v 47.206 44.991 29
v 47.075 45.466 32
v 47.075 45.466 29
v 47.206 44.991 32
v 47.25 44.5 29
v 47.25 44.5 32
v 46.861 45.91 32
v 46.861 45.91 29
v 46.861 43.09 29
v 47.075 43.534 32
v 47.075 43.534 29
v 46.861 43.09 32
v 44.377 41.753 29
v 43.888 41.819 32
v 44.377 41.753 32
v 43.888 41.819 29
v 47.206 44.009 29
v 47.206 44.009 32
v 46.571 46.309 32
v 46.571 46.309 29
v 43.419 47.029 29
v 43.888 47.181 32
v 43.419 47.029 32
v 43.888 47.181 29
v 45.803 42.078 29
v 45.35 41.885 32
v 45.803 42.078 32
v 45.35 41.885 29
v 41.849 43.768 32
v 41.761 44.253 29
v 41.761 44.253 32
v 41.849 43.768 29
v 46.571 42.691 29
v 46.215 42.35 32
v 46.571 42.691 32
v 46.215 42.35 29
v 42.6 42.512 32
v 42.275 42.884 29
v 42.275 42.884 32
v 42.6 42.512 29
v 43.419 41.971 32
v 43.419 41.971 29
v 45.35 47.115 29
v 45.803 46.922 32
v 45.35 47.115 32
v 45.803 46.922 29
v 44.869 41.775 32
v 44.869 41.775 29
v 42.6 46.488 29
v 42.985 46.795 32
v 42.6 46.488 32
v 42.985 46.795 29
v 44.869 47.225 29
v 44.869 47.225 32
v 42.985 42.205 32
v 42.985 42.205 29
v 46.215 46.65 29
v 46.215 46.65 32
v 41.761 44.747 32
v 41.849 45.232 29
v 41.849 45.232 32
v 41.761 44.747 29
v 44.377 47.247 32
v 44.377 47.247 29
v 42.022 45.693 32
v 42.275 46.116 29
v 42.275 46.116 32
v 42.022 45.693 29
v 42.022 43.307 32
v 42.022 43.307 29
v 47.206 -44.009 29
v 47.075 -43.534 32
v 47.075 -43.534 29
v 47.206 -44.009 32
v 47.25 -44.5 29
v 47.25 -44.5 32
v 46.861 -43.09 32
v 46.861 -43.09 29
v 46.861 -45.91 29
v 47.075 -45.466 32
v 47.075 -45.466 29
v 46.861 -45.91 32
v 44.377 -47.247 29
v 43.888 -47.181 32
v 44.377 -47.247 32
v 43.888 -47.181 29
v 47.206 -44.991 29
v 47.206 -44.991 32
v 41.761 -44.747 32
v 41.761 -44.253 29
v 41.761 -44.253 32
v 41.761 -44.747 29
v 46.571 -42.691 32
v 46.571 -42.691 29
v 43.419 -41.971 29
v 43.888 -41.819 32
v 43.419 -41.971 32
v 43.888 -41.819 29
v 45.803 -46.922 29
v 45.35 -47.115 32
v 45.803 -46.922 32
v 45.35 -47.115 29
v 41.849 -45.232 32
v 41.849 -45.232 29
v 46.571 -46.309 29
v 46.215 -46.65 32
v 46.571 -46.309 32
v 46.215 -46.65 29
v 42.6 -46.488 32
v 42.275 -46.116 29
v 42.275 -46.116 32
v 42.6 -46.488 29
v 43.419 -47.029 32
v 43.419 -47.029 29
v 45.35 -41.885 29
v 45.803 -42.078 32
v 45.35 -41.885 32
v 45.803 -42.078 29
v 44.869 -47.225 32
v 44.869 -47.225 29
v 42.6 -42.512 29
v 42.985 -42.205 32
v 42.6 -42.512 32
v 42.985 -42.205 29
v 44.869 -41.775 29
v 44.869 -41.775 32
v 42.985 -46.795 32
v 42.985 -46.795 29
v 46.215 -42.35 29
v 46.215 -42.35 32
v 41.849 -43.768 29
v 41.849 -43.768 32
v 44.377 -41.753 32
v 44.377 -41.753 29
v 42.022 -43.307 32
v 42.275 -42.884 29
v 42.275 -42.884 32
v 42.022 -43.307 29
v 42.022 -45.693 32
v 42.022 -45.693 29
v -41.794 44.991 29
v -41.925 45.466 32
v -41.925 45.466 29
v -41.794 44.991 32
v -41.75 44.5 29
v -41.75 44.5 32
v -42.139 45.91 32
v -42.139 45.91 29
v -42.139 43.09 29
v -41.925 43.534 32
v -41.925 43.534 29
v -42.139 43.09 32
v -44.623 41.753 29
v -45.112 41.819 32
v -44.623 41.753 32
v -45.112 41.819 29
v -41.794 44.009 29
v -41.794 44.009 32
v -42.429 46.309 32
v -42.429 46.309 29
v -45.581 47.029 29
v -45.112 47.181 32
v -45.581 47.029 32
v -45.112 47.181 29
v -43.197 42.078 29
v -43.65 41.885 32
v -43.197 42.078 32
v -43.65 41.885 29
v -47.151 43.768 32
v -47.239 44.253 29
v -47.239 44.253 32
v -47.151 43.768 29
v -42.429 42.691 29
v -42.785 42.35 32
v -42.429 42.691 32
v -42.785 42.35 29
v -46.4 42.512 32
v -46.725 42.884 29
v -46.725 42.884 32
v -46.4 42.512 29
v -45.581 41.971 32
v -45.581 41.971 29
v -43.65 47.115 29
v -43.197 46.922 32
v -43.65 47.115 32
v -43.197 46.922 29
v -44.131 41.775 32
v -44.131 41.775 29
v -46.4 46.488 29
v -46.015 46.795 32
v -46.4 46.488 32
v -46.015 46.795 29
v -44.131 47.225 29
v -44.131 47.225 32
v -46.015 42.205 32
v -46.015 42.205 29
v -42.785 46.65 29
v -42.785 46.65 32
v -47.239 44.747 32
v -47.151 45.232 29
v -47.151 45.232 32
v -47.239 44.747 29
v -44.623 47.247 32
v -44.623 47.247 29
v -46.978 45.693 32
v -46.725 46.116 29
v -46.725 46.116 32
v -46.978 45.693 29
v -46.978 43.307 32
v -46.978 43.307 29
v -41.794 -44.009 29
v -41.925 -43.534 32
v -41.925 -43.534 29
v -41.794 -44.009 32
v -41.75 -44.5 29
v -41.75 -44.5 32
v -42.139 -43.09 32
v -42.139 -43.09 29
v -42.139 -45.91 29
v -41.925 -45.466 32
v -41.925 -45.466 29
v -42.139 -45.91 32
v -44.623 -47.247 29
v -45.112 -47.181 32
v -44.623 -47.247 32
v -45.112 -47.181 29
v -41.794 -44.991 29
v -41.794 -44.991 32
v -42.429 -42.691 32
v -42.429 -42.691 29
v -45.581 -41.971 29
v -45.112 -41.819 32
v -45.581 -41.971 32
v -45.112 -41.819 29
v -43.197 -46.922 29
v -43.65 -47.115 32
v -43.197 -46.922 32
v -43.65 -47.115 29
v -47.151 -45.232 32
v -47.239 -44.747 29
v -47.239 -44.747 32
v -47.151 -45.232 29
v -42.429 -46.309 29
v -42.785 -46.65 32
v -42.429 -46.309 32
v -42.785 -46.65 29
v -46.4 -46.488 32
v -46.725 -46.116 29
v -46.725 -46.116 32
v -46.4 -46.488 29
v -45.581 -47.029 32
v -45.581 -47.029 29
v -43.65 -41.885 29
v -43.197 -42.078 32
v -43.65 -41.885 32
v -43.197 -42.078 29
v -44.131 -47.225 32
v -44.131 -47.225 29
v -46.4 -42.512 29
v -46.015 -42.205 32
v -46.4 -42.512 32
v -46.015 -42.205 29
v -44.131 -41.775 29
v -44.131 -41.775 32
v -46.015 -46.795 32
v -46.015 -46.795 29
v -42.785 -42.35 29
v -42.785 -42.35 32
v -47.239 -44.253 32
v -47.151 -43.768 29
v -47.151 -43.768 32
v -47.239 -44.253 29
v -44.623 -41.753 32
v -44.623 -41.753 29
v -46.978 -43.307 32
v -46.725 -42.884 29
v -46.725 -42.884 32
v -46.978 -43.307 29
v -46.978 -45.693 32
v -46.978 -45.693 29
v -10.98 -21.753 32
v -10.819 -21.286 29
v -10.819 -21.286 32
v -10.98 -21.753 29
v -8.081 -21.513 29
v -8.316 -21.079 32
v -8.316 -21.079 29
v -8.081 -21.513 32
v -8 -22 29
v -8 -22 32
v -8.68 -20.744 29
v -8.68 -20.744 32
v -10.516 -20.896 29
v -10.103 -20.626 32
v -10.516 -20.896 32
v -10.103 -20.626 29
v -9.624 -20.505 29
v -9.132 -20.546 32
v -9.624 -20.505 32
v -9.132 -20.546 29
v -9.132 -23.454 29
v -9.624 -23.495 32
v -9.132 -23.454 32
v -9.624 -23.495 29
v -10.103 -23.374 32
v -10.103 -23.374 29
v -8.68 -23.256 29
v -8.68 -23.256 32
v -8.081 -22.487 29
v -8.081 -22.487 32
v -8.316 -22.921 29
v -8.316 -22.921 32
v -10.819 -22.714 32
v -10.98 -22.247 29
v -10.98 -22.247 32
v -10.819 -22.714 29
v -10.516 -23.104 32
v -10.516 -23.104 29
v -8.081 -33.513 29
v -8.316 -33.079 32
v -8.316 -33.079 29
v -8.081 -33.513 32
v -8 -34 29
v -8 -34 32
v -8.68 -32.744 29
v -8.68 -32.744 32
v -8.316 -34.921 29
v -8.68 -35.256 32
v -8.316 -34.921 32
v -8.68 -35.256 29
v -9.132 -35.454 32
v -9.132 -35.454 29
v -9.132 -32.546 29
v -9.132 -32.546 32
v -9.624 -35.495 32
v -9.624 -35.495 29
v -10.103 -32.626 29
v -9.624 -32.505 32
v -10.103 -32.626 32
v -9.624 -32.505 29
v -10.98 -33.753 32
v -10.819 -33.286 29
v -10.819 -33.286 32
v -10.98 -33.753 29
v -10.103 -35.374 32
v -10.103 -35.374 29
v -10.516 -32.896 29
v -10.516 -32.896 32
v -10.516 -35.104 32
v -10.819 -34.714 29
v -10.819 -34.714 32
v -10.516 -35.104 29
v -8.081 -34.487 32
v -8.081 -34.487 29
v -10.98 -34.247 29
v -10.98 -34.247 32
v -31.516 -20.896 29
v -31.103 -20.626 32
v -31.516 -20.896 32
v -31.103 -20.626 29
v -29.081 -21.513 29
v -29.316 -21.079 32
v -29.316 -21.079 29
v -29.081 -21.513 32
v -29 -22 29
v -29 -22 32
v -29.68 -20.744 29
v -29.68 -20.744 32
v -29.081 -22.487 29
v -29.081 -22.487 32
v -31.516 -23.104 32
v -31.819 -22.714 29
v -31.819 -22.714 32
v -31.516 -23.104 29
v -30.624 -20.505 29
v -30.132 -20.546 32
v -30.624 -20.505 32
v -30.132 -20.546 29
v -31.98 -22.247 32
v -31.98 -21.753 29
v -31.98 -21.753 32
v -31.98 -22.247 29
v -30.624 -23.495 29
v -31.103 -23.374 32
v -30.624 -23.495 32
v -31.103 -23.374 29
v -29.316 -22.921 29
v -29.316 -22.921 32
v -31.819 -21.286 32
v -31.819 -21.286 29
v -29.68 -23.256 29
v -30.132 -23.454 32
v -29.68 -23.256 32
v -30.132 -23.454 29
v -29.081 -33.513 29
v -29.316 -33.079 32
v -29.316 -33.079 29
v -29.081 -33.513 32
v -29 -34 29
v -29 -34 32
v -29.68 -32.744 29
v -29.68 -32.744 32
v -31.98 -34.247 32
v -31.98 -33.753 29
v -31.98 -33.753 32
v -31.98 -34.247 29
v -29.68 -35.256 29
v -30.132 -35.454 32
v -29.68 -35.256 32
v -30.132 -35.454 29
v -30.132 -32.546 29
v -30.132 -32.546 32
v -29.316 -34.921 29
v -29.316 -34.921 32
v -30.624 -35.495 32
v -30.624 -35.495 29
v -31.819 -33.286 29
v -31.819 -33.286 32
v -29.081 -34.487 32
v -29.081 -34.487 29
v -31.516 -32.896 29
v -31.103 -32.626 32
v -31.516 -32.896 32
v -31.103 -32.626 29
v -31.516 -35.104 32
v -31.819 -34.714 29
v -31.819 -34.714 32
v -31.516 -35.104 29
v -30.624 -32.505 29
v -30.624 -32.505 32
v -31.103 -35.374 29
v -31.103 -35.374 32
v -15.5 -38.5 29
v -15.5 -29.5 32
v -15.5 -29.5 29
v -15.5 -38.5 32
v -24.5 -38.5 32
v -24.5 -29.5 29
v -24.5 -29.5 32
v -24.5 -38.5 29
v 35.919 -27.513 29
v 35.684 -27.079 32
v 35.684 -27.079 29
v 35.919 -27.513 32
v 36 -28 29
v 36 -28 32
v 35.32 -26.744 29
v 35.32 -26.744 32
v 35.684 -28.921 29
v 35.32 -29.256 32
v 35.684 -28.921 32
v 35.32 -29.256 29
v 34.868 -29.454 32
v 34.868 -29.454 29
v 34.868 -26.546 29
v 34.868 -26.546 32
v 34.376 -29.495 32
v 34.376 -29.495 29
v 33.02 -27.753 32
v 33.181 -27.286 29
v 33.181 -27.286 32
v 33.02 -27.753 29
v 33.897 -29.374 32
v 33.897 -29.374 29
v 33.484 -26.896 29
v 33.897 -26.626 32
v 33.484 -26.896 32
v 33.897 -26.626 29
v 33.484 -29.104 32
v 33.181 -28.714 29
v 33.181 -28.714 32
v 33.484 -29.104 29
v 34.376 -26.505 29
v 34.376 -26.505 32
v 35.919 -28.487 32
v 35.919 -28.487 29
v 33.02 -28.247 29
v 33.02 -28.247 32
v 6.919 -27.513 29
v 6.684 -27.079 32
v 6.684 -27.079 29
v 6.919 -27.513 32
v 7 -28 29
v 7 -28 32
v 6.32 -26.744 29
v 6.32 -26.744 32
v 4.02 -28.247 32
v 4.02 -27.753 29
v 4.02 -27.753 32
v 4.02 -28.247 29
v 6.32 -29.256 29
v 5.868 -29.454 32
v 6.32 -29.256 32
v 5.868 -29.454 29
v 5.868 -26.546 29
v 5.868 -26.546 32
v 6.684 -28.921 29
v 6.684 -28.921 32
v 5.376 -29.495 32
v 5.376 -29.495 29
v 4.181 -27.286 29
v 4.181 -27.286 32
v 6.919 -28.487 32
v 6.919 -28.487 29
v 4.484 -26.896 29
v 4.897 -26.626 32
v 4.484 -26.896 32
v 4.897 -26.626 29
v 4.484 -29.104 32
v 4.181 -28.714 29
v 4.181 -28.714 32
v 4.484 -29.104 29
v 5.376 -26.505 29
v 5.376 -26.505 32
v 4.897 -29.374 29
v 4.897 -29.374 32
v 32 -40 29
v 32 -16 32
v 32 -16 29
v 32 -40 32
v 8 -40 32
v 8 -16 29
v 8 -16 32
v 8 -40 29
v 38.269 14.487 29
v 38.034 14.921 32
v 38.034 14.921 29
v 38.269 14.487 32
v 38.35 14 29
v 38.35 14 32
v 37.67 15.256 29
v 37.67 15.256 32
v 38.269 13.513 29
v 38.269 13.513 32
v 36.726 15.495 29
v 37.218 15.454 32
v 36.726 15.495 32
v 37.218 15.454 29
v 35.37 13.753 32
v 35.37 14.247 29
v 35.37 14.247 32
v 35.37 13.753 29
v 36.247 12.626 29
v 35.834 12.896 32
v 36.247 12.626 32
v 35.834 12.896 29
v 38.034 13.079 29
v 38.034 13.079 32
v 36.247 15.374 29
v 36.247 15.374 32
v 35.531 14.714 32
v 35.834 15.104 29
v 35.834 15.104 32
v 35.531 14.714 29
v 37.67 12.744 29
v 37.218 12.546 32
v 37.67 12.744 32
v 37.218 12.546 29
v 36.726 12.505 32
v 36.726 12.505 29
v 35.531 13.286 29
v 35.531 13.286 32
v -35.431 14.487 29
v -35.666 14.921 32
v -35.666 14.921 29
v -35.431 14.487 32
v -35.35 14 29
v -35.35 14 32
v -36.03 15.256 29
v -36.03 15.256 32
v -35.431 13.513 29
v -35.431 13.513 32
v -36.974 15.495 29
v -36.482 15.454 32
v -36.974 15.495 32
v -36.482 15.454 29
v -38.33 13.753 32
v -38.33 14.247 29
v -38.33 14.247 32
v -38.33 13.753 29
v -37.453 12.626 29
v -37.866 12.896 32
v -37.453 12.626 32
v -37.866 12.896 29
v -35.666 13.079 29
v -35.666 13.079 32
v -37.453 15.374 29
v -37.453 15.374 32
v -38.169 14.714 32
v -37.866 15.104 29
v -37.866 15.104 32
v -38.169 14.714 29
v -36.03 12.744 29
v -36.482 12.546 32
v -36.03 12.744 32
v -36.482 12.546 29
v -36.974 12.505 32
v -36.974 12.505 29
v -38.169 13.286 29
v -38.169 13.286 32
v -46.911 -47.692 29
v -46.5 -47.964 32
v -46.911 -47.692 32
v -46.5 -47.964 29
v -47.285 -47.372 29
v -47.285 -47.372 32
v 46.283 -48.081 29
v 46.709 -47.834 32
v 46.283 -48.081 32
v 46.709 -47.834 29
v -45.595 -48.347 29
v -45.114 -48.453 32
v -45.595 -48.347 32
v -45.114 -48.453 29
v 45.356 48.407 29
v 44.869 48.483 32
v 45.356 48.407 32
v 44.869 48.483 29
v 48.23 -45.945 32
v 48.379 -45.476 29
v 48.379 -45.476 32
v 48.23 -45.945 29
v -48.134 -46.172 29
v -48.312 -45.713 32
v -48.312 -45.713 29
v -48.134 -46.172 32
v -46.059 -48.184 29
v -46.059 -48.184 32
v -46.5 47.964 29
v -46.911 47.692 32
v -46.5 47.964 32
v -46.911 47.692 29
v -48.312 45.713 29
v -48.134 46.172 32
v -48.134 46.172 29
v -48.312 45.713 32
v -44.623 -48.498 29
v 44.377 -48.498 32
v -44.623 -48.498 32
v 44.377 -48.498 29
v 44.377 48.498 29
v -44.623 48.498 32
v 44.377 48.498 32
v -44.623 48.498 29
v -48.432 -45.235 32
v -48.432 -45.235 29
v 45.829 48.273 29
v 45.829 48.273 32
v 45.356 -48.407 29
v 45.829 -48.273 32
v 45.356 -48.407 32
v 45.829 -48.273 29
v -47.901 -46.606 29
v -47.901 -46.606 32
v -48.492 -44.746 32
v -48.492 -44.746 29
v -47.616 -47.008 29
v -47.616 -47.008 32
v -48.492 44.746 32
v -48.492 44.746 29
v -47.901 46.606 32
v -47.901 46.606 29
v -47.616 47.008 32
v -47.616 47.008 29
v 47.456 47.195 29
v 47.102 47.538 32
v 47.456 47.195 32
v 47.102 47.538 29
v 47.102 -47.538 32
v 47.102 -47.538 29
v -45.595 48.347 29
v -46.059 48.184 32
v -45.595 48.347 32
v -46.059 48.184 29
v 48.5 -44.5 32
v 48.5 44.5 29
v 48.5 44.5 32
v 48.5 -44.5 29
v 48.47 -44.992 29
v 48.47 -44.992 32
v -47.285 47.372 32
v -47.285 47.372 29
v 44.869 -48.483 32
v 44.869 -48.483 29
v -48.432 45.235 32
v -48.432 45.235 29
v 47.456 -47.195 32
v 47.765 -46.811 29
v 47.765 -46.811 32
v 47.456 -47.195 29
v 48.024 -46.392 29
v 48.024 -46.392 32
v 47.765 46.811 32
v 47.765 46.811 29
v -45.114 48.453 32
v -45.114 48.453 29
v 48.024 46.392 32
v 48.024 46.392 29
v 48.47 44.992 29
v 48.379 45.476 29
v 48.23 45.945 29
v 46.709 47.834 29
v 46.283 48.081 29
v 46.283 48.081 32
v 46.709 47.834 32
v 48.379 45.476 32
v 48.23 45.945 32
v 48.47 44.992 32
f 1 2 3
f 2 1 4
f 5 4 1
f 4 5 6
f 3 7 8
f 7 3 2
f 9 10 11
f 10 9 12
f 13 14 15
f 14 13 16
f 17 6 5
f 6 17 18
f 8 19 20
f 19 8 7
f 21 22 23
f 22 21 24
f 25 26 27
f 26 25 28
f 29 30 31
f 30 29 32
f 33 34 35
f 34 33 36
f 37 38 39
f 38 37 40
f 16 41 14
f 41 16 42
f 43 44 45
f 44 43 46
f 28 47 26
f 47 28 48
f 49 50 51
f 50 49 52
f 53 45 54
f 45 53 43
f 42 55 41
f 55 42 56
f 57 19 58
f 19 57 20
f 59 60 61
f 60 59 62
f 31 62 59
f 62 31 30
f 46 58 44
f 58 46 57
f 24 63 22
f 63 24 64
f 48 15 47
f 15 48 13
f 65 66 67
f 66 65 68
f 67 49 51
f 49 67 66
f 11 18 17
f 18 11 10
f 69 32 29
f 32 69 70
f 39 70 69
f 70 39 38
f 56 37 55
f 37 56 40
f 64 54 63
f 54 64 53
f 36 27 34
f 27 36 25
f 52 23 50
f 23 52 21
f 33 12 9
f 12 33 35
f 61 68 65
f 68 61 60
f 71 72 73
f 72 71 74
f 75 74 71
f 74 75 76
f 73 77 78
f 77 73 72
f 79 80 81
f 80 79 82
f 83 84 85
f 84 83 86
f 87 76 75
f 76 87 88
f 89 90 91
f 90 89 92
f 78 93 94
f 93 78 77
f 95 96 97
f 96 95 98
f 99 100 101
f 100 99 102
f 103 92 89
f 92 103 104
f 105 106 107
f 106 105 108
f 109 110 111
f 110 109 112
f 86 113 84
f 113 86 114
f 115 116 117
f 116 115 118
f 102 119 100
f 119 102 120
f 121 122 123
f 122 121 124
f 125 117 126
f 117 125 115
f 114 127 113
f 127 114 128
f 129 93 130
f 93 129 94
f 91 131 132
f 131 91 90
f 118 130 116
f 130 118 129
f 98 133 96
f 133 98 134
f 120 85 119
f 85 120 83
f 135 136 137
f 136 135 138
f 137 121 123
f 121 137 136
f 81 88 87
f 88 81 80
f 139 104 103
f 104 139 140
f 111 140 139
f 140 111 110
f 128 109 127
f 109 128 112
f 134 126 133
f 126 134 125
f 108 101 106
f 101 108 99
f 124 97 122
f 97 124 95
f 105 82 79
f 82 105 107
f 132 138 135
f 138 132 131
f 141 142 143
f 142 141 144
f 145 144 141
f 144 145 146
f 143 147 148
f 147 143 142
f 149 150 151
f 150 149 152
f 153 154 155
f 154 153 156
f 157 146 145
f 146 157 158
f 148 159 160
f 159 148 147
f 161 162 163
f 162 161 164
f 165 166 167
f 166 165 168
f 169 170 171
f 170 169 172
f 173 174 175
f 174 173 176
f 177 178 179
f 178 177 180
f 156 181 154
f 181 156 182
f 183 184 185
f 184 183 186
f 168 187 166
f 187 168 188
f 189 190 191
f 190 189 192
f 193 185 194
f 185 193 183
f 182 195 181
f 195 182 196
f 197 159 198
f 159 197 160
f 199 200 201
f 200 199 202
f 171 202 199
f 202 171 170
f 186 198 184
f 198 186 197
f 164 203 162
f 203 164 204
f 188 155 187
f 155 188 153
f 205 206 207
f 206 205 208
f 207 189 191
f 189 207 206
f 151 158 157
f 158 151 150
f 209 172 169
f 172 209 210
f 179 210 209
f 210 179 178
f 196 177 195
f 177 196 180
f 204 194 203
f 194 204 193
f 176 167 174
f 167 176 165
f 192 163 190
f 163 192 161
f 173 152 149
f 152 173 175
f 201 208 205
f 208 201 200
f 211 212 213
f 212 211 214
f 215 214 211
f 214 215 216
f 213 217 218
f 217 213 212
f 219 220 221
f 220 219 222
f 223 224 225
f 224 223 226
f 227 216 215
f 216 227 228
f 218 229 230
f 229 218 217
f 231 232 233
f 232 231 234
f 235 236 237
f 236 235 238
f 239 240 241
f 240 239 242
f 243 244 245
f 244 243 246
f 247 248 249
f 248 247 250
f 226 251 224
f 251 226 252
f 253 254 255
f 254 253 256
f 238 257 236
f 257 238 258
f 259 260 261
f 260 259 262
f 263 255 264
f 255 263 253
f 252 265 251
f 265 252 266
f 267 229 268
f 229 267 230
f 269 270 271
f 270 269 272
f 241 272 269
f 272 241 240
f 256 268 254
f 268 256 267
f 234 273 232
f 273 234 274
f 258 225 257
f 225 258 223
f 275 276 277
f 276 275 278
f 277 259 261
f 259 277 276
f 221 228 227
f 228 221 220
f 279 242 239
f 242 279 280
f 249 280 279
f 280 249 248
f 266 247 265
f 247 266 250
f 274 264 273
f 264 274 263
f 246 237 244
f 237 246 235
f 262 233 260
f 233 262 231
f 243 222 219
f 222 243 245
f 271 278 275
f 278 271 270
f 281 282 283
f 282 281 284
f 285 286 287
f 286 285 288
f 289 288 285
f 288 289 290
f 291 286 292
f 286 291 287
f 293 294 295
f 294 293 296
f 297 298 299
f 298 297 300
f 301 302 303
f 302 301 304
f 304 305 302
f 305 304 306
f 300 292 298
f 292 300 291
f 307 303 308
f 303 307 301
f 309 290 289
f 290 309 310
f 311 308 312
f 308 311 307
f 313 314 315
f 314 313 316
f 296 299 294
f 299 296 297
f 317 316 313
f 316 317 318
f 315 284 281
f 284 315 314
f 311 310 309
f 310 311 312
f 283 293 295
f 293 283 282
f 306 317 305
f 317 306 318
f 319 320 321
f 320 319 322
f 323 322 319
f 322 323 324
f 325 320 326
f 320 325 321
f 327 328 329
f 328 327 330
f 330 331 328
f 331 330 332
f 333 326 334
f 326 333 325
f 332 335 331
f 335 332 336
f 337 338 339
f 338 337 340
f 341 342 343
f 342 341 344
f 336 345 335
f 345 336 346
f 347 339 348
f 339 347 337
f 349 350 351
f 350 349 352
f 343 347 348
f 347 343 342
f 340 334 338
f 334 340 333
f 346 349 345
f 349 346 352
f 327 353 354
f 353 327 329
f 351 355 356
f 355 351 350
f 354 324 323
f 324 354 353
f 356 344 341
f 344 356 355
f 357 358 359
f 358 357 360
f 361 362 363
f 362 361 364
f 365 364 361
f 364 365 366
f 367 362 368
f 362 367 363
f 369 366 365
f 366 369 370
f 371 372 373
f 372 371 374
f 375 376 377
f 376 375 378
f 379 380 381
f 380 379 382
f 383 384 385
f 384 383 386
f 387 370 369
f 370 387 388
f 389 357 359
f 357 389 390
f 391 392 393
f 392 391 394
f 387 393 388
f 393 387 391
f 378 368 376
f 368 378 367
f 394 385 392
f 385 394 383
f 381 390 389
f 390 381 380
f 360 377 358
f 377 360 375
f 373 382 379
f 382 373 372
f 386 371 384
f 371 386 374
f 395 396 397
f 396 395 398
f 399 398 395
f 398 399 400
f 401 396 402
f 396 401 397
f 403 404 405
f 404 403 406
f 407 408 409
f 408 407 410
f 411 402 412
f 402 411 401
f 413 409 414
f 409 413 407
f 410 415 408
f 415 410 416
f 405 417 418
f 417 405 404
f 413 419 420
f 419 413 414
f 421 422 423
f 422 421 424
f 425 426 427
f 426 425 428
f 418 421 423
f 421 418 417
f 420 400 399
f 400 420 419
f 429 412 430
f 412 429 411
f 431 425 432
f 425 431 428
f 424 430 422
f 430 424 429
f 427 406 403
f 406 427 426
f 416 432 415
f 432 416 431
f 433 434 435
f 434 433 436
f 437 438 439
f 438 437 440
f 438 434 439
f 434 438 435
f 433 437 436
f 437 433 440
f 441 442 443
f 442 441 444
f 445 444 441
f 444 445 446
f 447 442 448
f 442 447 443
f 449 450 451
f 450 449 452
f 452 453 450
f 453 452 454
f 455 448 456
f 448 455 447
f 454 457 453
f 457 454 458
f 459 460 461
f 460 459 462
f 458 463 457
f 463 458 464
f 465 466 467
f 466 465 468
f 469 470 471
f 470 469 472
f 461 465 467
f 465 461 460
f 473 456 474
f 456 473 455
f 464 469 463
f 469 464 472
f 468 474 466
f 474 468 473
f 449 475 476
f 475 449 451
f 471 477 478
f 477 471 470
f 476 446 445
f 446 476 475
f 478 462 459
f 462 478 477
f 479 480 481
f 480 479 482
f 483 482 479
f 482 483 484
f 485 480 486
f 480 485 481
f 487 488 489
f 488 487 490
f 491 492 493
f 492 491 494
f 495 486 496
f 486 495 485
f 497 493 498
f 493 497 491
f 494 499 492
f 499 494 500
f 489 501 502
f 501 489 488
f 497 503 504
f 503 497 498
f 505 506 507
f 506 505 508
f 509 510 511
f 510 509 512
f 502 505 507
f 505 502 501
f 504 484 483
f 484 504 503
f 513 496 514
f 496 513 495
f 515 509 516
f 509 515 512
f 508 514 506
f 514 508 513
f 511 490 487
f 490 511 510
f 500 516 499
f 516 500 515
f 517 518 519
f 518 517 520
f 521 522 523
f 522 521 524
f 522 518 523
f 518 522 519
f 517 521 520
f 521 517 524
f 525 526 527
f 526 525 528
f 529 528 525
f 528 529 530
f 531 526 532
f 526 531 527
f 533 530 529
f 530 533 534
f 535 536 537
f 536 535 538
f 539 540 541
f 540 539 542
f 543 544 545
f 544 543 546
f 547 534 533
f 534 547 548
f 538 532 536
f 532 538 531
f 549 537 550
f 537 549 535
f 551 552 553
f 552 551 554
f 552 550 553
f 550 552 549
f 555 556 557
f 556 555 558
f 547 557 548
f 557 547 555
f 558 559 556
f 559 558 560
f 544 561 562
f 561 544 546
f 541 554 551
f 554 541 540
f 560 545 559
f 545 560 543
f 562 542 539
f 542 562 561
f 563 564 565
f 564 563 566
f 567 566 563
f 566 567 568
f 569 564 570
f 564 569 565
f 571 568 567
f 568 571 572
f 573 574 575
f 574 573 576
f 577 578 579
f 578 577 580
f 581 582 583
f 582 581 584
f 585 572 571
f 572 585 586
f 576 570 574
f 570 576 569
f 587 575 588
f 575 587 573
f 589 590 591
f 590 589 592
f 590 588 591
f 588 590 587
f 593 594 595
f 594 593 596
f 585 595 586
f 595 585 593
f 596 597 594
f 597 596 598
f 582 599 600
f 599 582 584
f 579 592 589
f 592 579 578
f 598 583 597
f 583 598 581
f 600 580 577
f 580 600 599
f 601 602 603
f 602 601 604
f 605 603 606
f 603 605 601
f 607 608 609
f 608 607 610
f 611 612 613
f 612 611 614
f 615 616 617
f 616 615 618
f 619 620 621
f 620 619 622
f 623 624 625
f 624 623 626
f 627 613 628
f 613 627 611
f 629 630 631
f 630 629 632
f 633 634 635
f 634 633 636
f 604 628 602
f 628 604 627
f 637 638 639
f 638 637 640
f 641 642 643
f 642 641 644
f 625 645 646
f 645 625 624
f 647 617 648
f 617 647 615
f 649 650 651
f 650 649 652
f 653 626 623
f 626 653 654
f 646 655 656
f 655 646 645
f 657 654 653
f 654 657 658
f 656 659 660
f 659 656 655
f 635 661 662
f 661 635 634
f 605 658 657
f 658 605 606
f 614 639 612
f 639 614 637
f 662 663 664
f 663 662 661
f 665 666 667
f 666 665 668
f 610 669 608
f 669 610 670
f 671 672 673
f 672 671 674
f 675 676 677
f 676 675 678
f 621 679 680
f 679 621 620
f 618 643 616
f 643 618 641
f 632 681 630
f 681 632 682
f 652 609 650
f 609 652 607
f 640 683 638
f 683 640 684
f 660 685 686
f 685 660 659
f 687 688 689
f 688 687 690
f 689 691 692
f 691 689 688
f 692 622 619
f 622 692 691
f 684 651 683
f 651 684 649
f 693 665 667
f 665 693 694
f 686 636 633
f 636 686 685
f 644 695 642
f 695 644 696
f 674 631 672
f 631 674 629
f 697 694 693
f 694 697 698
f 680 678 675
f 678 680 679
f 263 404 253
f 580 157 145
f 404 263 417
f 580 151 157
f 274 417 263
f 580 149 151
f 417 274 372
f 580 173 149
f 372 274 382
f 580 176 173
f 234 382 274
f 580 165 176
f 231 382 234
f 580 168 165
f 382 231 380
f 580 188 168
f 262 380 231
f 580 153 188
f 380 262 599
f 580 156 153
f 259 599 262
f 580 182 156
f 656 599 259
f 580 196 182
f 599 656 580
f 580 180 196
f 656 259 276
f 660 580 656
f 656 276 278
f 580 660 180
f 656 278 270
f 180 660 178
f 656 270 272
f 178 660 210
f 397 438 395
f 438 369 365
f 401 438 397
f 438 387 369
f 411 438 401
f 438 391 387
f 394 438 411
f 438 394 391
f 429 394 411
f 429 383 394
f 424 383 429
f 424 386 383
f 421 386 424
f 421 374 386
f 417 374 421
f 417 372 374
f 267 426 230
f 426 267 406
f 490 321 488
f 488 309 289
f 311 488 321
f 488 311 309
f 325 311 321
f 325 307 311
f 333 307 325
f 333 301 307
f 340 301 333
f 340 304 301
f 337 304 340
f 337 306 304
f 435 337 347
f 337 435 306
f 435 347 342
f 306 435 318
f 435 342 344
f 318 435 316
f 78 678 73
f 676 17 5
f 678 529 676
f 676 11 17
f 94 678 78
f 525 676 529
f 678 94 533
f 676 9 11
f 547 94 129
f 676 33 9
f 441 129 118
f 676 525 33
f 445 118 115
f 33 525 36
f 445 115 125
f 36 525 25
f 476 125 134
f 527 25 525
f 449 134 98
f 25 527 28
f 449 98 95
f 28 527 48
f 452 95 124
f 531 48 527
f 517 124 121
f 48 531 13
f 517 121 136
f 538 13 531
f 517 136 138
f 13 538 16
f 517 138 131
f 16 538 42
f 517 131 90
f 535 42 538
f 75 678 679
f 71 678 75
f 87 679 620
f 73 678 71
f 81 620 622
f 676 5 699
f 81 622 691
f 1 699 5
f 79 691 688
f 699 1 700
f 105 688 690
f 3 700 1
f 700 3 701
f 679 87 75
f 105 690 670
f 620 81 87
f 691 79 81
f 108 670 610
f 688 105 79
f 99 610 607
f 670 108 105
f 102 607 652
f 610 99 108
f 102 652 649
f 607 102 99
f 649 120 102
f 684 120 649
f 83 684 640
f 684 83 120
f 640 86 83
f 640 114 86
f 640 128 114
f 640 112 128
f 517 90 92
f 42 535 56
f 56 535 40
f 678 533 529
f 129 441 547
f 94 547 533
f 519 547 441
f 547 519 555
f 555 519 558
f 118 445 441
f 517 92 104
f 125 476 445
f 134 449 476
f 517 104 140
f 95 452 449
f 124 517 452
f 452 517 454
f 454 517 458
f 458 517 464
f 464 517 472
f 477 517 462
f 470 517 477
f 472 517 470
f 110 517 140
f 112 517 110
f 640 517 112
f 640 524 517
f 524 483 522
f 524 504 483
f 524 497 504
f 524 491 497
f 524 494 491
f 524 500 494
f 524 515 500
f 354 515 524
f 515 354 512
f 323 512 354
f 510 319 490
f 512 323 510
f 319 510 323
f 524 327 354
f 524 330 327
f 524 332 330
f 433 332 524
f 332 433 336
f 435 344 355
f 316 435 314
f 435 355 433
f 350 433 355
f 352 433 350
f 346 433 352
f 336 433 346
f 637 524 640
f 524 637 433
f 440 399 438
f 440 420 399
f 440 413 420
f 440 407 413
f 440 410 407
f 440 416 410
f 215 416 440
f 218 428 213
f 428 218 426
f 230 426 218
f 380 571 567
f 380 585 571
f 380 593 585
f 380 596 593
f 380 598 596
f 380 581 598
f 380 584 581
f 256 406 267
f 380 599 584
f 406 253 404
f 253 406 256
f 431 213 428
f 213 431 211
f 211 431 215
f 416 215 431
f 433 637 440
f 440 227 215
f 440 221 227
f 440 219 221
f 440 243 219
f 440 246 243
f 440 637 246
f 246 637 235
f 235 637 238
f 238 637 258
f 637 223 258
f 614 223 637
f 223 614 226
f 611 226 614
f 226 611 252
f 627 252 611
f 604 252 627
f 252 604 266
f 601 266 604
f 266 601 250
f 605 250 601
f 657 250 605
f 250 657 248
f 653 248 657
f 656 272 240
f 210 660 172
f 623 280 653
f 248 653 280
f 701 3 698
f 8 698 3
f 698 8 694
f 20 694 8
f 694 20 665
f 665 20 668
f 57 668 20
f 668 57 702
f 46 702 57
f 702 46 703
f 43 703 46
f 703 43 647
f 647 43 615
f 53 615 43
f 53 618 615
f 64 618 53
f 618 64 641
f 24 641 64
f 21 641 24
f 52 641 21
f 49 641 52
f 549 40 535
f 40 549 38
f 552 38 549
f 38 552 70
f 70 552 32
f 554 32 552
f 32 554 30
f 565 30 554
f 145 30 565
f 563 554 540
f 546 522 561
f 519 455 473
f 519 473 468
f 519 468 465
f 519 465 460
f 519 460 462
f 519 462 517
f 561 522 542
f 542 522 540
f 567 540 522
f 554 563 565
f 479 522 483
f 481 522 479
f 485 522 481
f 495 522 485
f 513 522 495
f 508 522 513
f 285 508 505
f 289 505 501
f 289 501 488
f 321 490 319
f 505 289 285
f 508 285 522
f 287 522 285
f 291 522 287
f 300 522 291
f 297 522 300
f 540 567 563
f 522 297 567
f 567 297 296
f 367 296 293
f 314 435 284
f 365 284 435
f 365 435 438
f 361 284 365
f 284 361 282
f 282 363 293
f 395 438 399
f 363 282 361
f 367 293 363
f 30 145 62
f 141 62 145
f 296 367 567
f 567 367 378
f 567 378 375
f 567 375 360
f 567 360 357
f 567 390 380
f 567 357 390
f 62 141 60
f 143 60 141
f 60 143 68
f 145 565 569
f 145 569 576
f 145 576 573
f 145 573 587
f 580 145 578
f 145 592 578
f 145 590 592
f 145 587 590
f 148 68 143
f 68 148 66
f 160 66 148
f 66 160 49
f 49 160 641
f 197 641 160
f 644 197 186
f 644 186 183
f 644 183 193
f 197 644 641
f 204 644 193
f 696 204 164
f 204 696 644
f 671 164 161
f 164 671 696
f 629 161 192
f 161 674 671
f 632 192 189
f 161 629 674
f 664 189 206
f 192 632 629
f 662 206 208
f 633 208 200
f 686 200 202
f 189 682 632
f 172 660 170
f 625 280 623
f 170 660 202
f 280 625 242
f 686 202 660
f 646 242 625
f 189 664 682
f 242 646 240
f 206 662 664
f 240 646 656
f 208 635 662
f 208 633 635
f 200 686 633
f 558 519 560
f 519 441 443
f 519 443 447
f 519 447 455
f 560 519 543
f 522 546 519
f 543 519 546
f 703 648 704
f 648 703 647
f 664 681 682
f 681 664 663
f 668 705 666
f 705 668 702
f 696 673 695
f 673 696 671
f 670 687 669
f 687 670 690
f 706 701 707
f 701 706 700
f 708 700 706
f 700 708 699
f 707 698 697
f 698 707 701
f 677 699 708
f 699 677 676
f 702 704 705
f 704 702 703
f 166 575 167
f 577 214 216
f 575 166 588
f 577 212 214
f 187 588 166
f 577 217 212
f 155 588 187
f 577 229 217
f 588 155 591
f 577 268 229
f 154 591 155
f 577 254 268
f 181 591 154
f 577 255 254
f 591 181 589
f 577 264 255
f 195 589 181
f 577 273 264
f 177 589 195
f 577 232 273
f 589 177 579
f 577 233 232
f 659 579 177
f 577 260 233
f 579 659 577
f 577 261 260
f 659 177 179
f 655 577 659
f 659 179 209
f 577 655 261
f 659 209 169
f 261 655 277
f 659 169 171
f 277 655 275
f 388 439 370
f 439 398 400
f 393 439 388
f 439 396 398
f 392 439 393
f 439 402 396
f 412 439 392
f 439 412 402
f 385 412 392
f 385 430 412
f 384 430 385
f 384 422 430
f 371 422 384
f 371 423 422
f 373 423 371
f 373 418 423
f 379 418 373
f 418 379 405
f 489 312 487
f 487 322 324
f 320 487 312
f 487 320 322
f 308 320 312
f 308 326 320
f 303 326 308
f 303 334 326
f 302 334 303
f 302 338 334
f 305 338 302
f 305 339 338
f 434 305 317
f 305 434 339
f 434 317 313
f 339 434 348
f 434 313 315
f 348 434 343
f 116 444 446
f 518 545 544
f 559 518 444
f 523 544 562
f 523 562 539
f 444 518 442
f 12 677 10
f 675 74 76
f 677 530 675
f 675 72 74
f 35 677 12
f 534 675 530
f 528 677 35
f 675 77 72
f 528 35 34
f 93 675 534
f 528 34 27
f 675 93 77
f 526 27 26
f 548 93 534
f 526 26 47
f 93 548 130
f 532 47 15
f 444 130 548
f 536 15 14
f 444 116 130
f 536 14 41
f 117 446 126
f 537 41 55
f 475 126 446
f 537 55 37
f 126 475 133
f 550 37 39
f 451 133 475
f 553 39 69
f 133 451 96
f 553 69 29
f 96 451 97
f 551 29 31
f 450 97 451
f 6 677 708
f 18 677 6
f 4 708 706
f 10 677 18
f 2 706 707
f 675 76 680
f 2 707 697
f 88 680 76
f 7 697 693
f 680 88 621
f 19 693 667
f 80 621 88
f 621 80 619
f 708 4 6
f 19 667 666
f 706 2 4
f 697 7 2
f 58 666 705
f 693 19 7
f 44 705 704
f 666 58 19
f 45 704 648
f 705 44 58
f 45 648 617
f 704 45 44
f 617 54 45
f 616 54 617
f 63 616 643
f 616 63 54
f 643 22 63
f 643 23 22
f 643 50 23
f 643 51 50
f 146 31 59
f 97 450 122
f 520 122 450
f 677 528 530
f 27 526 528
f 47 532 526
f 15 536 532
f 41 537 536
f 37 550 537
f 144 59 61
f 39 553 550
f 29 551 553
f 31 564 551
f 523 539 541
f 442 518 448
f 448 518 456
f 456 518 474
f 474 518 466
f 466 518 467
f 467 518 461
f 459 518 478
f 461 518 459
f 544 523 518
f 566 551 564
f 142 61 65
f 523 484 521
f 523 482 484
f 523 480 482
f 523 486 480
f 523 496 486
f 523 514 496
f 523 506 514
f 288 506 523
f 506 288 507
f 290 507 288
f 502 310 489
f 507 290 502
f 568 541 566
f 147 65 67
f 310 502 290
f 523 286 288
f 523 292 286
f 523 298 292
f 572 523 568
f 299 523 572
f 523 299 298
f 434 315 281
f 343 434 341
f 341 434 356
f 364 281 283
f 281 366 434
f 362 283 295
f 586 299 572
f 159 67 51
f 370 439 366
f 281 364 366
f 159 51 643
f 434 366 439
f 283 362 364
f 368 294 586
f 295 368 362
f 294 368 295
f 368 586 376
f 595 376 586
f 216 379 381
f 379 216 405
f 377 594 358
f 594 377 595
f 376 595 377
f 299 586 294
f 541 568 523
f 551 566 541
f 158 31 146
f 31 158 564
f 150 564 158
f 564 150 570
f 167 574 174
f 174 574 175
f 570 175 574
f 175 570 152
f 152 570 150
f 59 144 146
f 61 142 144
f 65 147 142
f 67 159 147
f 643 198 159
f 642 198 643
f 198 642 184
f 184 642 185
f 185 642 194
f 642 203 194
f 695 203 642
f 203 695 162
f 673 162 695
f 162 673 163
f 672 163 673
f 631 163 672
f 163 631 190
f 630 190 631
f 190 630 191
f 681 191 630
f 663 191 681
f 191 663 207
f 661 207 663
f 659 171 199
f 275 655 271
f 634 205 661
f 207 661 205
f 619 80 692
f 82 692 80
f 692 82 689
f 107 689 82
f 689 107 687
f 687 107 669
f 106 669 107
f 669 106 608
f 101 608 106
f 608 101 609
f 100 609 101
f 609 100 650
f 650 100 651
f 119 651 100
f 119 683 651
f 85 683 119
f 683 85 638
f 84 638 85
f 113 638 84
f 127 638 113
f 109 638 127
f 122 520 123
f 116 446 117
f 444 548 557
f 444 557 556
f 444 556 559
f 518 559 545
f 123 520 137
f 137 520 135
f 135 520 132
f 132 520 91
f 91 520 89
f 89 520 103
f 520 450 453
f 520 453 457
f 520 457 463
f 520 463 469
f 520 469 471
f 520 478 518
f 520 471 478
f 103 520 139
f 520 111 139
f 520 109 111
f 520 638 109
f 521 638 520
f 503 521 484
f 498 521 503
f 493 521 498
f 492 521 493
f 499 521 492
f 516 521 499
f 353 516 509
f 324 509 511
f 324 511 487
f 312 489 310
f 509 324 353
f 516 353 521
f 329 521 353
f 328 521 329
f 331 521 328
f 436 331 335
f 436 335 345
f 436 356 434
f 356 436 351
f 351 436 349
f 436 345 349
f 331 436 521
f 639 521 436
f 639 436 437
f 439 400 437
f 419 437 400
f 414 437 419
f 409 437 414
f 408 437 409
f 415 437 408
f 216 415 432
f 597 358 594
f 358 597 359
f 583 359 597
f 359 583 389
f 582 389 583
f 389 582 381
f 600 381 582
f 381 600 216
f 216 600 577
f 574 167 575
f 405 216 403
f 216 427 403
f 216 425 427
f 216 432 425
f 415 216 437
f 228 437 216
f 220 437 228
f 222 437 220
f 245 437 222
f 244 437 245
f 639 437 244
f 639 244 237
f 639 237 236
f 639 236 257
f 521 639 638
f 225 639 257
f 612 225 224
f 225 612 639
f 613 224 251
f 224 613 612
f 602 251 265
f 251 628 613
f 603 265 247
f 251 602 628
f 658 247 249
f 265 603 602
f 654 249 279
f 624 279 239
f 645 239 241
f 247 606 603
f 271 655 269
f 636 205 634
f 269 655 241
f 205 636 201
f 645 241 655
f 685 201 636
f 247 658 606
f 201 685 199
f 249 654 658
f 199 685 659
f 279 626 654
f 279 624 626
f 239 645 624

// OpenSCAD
$fa=0.5;
$fs=0.5;

// RPi Dimensions: 65mm x 56mm

module corner(radius=4, height=3) {
    cylinder(r=radius, h=height, center=true);
}

module RPiMountingHole(h=20) {
    cylinder(r=1.825, h=h, center=true);
}

module baseMountingHole(h=20) {
    cylinder(r=3, h=h, center=true);
}

module baseCorners(padding=0, z=0) {
    for (x=[32.5+padding, -32.5-padding]) { 
        for (y=[32.5+padding, -32.5-padding]) { 
            translate([x, y, z])
            corner(radius=2.75, height=10);
        }
    }
}

module standoff(standoffHeight=4) {
    difference() {
        cylinder(r=2.75, h=standoffHeight, center=true);
        cylinder(r=1.825, h=standoffHeight*1.1, center=true);
    }
}

module spacer(radius=2.75, thickness=1.25, height=30) {
    difference() {
        cylinder(r=radius+thickness, height, center=true);
        cylinder(r=radius, 110, center=true);
    }
}



module enclosure(wallThickness=3,
                RPiOffsetX=-12,
                RPiOffsetY=0,
                edgePadding=12,
                printRPi=false,
                standoffHeight=4,
                spcRPiH=26,
                spcSpeakerH=18,
                spcGrillH=6,
                printGrill=false,
                totalRings=16,
                maxGrillHoleRadius=2.25) {
    
    // Base
    /*translate([0, 0, wallThickness/2])
        difference() {
            
            hull() {
                for (x=[32.5+edgePadding, -32.5-edgePadding]) { 
                    for (y=[32.5+edgePadding, -32.5-edgePadding]) { 
                        translate([x, y, 0])
                            corner(height=wallThickness);
                    }
                }
            }
            
            // holes; -3.5 from RPI edge
            translate([RPiOffsetX, RPiOffsetY, 0])
                for (x=[29.25, -29.25]) { 
                    for (y=[24.75, -24.75]) { 
                        translate([x, y, 0])
                            RPiMountingHole();
                    }
                }
            
            baseCorners(padding=edgePadding, z=0);
        };*/
        
    // Standoffs
    /*translate([RPiOffsetX, RPiOffsetY, 0])
        for (x=[29.25, -29.25]) { 
                for (y=[24.75, -24.75]) {  
                translate([x, y, standoffHeight/2 + wallThickness])
                    standoff(standoffHeight=4);
            }
        };*/

    
    // spacers; base -> speaker bottom mount
    /*for (x=[32.5+edgePadding, -32.5-edgePadding]) { 
        for (y=[32.5+edgePadding, -32.5-edgePadding]) { 
            translate([x, y, spcRPiH/2 + wallThickness])
            spacer(height=spcRPiH);
        }
    }*/
    
    difference() {
    
    // top plate
    difference() {
        
        mountZ = spcRPiH + wallThickness * 1.5;
        
        hull() {
            for (x=[32.5+edgePadding, -32.5-edgePadding]) { 
                for (y=[32.5+edgePadding, -32.5-edgePadding]) { 
                    translate([x, y, mountZ])
                        corner(height=wallThickness);
                }
            }
        }
        
        baseCorners(padding=edgePadding, z=mountZ);
        
        // camera mounts
        translate([-20, -28, 0]) {
            for (x=[10.5, -10.5]) { 
                for (y=[6, -6]) {
                    translate([x, y, mountZ])
                        cylinder(r=1.5, h=10, center=true);
                }
            }
        
            color([1, 0, 0])
                translate([0, -6, mountZ])
                    cube(9, true);
        }
        
        // motion detector mounts
        translate([20, 0, 0]) {
            for (x=[14.5, -14.5]) { 
                translate([x, -28, mountZ])
                    cylinder(r=1.5, h=10, center=true);
            }
        
            color([1, 0, 0])
                translate([0, -28, mountZ])
                    cube(24, true);
        }
        
        // lidar mounts
        for (x=[15, -15]) { 
                for (y=[10 + 4, -10 - 4]) { 
                    translate([x, y, 0])
                        cylinder(r=2, h=10, center=true);
                }
         }
         
        // proto board mounts
        for (x=[36.85, -36.85]) { 
            translate([x, 14, mountZ])
                cylinder(r=1.5, h=10, center=true);
        }
        
        // proto board (hide)
        /*translate([0, 14, mountZ])
                cube([81, 51, 100], center=true);*/
        
    }
    
    /*translate([70, 0, 0])
        cube(100, true);
    
    translate([-70, 0, 0])
        cube(100, true);
    
    translate([0, 70, 0])
        cube(100, true);*/
    }
}

enclosure(printGrill=false, totalRings= 16);

//spacer(height=41);

// screws
/*screwHeight = spcRPiH + (wallThickness * 4) + spcSpeakerH;
echo("outer screw height: ");
echo(screwHeight);
color("red")
translate([0, 0, screwHeight/2])
    cylinder(r=3, h=screwHeight, center=true);*/
